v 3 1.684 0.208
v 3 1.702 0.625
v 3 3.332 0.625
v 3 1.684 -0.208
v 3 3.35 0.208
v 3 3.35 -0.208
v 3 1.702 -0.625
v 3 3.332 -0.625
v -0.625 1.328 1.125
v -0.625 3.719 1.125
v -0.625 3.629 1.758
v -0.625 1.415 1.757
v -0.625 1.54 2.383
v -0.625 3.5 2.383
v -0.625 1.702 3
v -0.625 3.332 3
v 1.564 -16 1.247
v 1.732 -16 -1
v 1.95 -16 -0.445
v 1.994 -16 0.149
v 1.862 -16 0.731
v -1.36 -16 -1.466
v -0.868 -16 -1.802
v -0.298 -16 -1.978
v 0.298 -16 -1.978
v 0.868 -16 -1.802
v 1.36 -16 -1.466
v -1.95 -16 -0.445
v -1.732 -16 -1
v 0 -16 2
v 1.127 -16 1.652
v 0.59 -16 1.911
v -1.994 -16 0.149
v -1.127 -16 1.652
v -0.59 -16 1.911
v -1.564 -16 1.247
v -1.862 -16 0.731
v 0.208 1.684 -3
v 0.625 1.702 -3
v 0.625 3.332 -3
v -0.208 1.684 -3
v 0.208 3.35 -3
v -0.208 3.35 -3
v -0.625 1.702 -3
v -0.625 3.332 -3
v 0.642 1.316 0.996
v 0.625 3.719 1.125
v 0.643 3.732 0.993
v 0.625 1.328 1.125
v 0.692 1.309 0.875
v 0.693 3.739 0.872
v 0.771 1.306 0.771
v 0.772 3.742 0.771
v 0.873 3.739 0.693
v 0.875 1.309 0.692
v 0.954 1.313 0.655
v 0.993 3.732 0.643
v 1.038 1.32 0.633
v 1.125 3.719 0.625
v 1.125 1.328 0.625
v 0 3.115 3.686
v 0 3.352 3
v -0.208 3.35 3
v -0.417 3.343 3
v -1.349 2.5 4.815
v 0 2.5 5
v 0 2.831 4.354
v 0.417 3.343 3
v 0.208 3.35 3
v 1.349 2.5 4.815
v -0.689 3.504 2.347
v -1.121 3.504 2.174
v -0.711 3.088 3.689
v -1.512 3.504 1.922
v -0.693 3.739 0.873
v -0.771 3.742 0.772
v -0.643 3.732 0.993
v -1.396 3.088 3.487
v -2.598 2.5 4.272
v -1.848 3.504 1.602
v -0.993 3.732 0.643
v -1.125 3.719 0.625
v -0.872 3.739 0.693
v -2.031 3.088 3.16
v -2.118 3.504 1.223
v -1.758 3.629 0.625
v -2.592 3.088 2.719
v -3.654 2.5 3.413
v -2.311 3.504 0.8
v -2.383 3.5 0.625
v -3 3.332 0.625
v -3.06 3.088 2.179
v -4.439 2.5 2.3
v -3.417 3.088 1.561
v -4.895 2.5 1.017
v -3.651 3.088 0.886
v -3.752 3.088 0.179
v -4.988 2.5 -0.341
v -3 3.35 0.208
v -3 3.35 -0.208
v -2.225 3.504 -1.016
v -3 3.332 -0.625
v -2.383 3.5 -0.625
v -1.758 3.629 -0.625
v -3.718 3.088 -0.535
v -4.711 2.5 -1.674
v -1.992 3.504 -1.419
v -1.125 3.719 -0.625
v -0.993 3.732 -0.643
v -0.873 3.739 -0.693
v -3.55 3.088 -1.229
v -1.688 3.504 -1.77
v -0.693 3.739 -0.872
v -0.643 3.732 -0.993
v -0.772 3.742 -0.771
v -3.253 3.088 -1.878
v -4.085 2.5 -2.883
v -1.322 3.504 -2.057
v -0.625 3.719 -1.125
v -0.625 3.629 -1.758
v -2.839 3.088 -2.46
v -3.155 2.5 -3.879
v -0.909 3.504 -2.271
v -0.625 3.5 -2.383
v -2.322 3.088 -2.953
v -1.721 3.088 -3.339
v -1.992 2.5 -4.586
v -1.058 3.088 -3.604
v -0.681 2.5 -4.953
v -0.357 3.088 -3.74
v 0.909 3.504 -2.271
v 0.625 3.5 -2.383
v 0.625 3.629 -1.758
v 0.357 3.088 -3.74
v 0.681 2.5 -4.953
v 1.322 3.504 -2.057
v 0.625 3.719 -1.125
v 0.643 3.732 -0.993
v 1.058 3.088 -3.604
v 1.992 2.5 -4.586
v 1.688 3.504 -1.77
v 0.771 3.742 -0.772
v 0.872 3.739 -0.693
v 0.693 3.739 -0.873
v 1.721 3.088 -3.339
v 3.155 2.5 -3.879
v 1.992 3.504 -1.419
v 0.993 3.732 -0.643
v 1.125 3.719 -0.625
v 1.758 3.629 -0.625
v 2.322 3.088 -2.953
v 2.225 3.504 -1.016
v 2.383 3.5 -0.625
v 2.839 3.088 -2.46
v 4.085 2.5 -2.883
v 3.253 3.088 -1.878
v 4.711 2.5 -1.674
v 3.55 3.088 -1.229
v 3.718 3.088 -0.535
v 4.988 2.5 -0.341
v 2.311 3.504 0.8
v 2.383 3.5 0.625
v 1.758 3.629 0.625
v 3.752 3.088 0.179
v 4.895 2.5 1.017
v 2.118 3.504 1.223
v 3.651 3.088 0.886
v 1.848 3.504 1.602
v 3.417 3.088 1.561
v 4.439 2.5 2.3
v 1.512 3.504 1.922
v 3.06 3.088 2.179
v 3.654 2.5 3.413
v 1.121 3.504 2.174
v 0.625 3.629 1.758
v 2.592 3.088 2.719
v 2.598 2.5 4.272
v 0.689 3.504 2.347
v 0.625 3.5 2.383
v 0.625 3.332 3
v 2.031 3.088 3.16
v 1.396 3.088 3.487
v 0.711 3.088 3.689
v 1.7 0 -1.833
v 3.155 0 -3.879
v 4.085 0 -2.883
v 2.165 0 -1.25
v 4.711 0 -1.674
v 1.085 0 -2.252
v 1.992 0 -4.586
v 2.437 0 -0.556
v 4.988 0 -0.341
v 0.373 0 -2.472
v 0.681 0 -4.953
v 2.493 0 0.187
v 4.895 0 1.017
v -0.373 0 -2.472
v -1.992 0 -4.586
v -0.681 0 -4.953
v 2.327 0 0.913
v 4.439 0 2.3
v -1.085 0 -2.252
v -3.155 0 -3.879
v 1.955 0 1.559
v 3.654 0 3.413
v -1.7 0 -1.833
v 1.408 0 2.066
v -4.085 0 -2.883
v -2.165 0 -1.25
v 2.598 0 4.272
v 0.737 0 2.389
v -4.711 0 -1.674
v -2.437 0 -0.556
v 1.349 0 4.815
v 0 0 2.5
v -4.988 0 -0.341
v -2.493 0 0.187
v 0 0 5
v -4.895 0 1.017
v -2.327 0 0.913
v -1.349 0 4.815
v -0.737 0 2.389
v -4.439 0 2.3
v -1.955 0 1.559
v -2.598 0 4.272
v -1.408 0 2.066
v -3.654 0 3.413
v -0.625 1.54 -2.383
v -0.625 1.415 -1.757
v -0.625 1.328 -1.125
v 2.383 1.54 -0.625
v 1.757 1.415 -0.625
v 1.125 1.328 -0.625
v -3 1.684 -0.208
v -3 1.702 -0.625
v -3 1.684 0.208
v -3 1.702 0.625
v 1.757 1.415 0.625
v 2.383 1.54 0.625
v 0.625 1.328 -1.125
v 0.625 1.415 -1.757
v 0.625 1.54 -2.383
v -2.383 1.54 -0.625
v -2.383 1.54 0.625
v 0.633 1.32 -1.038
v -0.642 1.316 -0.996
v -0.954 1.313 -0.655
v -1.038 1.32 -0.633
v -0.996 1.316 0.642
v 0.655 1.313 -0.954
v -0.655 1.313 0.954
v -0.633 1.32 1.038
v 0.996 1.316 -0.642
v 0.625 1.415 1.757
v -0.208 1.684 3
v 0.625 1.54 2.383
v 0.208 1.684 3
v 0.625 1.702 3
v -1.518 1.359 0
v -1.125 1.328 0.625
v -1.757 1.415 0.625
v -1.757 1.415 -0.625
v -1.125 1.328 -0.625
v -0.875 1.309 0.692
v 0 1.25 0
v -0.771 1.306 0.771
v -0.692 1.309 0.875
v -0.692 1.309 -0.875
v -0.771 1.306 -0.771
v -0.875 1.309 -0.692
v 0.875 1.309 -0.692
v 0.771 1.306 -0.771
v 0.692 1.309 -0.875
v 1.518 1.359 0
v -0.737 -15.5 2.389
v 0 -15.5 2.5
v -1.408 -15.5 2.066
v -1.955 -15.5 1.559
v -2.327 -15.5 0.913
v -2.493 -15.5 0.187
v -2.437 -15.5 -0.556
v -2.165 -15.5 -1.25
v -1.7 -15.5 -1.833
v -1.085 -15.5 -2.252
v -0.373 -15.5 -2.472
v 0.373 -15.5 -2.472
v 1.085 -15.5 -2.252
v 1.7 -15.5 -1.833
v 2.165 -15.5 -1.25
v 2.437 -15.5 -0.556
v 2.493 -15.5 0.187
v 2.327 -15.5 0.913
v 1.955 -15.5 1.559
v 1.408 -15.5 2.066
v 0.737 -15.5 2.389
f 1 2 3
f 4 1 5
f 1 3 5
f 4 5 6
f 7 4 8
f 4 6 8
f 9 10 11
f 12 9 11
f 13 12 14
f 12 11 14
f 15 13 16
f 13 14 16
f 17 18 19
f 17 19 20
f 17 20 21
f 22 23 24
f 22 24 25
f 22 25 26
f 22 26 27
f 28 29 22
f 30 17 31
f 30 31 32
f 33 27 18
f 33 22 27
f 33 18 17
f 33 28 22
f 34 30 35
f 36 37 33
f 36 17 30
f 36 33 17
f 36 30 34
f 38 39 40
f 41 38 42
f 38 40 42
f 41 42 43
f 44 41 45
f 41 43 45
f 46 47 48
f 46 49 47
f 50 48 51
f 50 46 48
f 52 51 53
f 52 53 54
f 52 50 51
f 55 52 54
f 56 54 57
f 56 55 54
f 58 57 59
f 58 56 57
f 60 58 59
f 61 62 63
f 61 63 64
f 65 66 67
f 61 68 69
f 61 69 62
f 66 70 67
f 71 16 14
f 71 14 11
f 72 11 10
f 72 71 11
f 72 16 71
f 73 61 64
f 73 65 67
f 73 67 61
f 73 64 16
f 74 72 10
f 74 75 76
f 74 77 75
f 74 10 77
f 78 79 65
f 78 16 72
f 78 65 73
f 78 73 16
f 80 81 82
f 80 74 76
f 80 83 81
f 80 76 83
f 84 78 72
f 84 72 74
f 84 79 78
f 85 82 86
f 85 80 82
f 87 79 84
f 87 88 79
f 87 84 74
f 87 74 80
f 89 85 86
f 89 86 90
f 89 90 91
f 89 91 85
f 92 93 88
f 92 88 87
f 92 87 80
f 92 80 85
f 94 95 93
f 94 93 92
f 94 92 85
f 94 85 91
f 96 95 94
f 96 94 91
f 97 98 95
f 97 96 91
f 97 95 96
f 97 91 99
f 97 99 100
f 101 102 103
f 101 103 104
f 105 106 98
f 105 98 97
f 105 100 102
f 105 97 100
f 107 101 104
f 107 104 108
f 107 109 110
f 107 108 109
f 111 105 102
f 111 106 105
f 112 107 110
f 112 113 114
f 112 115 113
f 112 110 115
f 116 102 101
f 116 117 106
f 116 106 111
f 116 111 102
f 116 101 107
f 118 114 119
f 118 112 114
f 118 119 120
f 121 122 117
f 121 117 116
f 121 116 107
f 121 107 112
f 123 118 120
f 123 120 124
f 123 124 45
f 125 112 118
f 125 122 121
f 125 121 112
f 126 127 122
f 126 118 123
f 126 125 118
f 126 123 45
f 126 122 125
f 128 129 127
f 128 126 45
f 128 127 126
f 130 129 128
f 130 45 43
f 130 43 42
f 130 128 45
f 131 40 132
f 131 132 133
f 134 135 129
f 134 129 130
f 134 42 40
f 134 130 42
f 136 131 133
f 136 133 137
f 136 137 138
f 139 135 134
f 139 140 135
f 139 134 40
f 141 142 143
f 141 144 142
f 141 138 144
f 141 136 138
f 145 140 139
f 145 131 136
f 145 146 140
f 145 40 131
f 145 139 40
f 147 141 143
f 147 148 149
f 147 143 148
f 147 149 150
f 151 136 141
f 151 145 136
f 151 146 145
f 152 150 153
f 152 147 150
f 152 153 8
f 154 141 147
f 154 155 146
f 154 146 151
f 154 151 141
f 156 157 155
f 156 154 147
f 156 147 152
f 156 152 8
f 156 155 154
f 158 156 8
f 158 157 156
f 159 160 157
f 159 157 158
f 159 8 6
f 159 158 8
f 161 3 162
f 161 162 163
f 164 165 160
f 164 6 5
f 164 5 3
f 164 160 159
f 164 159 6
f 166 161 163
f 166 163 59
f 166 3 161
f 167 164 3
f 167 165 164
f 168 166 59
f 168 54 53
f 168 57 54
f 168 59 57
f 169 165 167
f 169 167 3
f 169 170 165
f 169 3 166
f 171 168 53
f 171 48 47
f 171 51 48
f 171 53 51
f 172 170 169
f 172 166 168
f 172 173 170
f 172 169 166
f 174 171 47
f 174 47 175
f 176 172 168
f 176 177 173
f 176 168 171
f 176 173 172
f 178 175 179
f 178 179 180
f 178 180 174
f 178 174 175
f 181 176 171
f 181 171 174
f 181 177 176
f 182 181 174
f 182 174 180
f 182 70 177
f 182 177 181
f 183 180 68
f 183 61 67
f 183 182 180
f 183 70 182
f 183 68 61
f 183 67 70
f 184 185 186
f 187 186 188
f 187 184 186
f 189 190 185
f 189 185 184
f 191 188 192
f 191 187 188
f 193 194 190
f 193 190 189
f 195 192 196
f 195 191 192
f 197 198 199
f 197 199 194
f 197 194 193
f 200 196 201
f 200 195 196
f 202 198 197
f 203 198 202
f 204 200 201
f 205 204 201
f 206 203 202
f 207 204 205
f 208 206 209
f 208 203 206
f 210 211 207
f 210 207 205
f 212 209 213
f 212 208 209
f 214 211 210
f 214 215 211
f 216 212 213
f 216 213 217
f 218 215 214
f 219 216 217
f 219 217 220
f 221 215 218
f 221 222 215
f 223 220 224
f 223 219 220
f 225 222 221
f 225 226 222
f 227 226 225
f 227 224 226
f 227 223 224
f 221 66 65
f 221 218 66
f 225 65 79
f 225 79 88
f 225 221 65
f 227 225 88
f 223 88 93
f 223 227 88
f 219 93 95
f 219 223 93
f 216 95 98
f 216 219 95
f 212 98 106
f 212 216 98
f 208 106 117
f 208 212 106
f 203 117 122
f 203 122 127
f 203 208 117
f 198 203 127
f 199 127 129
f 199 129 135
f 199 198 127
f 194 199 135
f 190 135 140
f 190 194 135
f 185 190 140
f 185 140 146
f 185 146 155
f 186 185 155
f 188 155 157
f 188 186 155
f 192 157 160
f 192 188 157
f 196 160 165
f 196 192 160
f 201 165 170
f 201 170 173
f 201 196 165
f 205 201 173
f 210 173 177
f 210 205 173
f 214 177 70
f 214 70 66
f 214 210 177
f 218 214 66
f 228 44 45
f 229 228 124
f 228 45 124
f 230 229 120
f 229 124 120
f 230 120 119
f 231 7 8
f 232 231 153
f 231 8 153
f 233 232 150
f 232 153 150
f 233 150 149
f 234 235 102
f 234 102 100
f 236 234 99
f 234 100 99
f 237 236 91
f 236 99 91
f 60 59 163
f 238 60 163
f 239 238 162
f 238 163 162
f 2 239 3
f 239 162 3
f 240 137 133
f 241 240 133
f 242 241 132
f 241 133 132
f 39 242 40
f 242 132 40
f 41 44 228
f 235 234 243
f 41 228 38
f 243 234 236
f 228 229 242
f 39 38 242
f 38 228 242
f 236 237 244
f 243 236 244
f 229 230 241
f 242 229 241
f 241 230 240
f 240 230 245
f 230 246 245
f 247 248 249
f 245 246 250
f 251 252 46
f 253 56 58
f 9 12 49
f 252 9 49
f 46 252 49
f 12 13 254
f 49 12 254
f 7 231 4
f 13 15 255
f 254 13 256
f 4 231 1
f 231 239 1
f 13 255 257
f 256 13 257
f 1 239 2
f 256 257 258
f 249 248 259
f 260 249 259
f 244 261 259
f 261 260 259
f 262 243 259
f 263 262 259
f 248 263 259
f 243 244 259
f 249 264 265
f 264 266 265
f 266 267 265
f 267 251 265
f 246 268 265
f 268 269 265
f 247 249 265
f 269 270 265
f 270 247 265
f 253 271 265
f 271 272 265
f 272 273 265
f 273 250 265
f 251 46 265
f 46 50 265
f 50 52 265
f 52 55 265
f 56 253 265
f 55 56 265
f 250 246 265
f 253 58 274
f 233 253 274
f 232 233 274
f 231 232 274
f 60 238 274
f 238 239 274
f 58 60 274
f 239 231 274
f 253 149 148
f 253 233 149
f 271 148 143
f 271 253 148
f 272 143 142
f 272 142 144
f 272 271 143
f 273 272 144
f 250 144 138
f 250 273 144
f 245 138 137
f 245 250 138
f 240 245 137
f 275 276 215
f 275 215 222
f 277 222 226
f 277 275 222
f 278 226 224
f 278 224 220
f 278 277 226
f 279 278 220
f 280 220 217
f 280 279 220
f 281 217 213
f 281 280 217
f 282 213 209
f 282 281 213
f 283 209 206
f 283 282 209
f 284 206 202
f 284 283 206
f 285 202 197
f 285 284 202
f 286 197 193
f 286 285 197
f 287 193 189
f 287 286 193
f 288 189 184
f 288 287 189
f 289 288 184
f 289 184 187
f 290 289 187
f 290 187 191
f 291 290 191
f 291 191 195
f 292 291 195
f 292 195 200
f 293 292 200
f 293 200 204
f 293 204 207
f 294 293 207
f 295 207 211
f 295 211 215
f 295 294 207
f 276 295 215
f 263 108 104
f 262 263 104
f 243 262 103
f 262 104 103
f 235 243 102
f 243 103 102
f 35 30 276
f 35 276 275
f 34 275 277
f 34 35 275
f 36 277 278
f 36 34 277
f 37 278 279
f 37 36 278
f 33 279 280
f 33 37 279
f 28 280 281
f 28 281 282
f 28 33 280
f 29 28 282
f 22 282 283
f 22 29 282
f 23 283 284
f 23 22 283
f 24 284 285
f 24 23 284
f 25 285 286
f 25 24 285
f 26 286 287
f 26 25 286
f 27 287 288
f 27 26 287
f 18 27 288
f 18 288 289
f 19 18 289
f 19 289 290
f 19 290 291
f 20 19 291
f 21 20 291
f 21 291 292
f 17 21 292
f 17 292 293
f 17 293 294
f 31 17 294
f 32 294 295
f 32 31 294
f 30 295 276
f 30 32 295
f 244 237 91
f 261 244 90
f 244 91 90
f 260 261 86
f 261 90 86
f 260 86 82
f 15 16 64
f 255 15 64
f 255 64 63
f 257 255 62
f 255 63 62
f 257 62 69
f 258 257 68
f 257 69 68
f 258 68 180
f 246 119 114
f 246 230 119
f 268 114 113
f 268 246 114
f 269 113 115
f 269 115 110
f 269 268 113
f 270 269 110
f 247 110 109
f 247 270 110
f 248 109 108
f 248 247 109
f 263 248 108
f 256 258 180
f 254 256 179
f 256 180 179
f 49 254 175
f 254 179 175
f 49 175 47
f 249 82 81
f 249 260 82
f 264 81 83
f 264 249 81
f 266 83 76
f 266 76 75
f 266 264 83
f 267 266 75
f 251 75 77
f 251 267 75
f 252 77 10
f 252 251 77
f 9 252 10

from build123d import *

# Parameters (mm, degrees)
CUT_EXTRUDE1_REACH      = 39.493
CUT_EXTRUDE1_END_RADIUS = 10.625
CUT_EXTRUDE1_START      = 20
FILLET1_R               = 0.5
CHAMFER1_SIZE           = 0.5


with BuildPart() as part:
    # Sketch1 → Revolve1 (revolve)
    with BuildSketch(Plane.XY, mode=Mode.PRIVATE) as revolve1_sk:
        with BuildLine():
            Line((0, 0), (0, 3.8))
            ThreePointArc((0, 3.8), (2.583118271, 3.469685656), (5, 2.5))
            Line((5, 2.5), (5, 0))
            Line((5, 0), (2.5, 0))
            Line((2.5, 0), (2.5, -16))
            Line((2.5, -16), (0, -16))
            Line((0, -16), (0, 0))
        make_face()
    revolve(revolve1_sk.sketch.rotate(Axis((0, 3.8, 0), (0, -1, 0)), 90), axis=Axis((0, 3.8, 0), (0, -1, 0)))

    # Cut-Extrude1: up to this sphere (the profile starts inside it)
    cut_extrude1_end = Location((0, 11.875, 0)) * Sphere(CUT_EXTRUDE1_END_RADIUS, mode=Mode.PRIVATE)
    # Sketch4 → Cut-Extrude1 (cut, up to the surface)
    with BuildSketch(Plane(origin=(0, 0, 0), x_dir=(1, 0, 0), z_dir=(0, 1, 0)).offset(CUT_EXTRUDE1_START), mode=Mode.PRIVATE) as cut_extrude1_sk1:
        Polygon((-0.625, -0.625), (-0.625, -3), (0.625, -3), (0.625, -0.625), (3, -0.625), (3, 0.625), (0.625, 0.625), (0.625, 3), (-0.625, 3), (-0.625, 0.625), (-3, 0.625), (-3, -0.625), align=None)
    cut_extrude1_tool1 = extrude(cut_extrude1_sk1.sketch, amount=-CUT_EXTRUDE1_REACH, mode=Mode.PRIVATE) & cut_extrude1_end
    add(cut_extrude1_tool1.solids().sort_by_distance((0, 20, 0))[0], mode=Mode.SUBTRACT)

    # Fillet1
    fillet1_edges = [part.edges().sort_by_distance(p)[0] for p in [
        (0.625, 2.524352551, 0.625),
        (-0.625, 2.524352551, 0.625),
        (-0.625, 2.524352551, -0.625),
        (0.625, 2.524352551, -0.625),
    ]]
    fillet(fillet1_edges, radius=FILLET1_R)

    # Chamfer1
    chamfer1_edges = [part.edges().sort_by_distance(p)[0] for p in [
        (0, -16, -2.5),
    ]]
    chamfer(chamfer1_edges, length=CHAMFER1_SIZE)


solid = part.part
